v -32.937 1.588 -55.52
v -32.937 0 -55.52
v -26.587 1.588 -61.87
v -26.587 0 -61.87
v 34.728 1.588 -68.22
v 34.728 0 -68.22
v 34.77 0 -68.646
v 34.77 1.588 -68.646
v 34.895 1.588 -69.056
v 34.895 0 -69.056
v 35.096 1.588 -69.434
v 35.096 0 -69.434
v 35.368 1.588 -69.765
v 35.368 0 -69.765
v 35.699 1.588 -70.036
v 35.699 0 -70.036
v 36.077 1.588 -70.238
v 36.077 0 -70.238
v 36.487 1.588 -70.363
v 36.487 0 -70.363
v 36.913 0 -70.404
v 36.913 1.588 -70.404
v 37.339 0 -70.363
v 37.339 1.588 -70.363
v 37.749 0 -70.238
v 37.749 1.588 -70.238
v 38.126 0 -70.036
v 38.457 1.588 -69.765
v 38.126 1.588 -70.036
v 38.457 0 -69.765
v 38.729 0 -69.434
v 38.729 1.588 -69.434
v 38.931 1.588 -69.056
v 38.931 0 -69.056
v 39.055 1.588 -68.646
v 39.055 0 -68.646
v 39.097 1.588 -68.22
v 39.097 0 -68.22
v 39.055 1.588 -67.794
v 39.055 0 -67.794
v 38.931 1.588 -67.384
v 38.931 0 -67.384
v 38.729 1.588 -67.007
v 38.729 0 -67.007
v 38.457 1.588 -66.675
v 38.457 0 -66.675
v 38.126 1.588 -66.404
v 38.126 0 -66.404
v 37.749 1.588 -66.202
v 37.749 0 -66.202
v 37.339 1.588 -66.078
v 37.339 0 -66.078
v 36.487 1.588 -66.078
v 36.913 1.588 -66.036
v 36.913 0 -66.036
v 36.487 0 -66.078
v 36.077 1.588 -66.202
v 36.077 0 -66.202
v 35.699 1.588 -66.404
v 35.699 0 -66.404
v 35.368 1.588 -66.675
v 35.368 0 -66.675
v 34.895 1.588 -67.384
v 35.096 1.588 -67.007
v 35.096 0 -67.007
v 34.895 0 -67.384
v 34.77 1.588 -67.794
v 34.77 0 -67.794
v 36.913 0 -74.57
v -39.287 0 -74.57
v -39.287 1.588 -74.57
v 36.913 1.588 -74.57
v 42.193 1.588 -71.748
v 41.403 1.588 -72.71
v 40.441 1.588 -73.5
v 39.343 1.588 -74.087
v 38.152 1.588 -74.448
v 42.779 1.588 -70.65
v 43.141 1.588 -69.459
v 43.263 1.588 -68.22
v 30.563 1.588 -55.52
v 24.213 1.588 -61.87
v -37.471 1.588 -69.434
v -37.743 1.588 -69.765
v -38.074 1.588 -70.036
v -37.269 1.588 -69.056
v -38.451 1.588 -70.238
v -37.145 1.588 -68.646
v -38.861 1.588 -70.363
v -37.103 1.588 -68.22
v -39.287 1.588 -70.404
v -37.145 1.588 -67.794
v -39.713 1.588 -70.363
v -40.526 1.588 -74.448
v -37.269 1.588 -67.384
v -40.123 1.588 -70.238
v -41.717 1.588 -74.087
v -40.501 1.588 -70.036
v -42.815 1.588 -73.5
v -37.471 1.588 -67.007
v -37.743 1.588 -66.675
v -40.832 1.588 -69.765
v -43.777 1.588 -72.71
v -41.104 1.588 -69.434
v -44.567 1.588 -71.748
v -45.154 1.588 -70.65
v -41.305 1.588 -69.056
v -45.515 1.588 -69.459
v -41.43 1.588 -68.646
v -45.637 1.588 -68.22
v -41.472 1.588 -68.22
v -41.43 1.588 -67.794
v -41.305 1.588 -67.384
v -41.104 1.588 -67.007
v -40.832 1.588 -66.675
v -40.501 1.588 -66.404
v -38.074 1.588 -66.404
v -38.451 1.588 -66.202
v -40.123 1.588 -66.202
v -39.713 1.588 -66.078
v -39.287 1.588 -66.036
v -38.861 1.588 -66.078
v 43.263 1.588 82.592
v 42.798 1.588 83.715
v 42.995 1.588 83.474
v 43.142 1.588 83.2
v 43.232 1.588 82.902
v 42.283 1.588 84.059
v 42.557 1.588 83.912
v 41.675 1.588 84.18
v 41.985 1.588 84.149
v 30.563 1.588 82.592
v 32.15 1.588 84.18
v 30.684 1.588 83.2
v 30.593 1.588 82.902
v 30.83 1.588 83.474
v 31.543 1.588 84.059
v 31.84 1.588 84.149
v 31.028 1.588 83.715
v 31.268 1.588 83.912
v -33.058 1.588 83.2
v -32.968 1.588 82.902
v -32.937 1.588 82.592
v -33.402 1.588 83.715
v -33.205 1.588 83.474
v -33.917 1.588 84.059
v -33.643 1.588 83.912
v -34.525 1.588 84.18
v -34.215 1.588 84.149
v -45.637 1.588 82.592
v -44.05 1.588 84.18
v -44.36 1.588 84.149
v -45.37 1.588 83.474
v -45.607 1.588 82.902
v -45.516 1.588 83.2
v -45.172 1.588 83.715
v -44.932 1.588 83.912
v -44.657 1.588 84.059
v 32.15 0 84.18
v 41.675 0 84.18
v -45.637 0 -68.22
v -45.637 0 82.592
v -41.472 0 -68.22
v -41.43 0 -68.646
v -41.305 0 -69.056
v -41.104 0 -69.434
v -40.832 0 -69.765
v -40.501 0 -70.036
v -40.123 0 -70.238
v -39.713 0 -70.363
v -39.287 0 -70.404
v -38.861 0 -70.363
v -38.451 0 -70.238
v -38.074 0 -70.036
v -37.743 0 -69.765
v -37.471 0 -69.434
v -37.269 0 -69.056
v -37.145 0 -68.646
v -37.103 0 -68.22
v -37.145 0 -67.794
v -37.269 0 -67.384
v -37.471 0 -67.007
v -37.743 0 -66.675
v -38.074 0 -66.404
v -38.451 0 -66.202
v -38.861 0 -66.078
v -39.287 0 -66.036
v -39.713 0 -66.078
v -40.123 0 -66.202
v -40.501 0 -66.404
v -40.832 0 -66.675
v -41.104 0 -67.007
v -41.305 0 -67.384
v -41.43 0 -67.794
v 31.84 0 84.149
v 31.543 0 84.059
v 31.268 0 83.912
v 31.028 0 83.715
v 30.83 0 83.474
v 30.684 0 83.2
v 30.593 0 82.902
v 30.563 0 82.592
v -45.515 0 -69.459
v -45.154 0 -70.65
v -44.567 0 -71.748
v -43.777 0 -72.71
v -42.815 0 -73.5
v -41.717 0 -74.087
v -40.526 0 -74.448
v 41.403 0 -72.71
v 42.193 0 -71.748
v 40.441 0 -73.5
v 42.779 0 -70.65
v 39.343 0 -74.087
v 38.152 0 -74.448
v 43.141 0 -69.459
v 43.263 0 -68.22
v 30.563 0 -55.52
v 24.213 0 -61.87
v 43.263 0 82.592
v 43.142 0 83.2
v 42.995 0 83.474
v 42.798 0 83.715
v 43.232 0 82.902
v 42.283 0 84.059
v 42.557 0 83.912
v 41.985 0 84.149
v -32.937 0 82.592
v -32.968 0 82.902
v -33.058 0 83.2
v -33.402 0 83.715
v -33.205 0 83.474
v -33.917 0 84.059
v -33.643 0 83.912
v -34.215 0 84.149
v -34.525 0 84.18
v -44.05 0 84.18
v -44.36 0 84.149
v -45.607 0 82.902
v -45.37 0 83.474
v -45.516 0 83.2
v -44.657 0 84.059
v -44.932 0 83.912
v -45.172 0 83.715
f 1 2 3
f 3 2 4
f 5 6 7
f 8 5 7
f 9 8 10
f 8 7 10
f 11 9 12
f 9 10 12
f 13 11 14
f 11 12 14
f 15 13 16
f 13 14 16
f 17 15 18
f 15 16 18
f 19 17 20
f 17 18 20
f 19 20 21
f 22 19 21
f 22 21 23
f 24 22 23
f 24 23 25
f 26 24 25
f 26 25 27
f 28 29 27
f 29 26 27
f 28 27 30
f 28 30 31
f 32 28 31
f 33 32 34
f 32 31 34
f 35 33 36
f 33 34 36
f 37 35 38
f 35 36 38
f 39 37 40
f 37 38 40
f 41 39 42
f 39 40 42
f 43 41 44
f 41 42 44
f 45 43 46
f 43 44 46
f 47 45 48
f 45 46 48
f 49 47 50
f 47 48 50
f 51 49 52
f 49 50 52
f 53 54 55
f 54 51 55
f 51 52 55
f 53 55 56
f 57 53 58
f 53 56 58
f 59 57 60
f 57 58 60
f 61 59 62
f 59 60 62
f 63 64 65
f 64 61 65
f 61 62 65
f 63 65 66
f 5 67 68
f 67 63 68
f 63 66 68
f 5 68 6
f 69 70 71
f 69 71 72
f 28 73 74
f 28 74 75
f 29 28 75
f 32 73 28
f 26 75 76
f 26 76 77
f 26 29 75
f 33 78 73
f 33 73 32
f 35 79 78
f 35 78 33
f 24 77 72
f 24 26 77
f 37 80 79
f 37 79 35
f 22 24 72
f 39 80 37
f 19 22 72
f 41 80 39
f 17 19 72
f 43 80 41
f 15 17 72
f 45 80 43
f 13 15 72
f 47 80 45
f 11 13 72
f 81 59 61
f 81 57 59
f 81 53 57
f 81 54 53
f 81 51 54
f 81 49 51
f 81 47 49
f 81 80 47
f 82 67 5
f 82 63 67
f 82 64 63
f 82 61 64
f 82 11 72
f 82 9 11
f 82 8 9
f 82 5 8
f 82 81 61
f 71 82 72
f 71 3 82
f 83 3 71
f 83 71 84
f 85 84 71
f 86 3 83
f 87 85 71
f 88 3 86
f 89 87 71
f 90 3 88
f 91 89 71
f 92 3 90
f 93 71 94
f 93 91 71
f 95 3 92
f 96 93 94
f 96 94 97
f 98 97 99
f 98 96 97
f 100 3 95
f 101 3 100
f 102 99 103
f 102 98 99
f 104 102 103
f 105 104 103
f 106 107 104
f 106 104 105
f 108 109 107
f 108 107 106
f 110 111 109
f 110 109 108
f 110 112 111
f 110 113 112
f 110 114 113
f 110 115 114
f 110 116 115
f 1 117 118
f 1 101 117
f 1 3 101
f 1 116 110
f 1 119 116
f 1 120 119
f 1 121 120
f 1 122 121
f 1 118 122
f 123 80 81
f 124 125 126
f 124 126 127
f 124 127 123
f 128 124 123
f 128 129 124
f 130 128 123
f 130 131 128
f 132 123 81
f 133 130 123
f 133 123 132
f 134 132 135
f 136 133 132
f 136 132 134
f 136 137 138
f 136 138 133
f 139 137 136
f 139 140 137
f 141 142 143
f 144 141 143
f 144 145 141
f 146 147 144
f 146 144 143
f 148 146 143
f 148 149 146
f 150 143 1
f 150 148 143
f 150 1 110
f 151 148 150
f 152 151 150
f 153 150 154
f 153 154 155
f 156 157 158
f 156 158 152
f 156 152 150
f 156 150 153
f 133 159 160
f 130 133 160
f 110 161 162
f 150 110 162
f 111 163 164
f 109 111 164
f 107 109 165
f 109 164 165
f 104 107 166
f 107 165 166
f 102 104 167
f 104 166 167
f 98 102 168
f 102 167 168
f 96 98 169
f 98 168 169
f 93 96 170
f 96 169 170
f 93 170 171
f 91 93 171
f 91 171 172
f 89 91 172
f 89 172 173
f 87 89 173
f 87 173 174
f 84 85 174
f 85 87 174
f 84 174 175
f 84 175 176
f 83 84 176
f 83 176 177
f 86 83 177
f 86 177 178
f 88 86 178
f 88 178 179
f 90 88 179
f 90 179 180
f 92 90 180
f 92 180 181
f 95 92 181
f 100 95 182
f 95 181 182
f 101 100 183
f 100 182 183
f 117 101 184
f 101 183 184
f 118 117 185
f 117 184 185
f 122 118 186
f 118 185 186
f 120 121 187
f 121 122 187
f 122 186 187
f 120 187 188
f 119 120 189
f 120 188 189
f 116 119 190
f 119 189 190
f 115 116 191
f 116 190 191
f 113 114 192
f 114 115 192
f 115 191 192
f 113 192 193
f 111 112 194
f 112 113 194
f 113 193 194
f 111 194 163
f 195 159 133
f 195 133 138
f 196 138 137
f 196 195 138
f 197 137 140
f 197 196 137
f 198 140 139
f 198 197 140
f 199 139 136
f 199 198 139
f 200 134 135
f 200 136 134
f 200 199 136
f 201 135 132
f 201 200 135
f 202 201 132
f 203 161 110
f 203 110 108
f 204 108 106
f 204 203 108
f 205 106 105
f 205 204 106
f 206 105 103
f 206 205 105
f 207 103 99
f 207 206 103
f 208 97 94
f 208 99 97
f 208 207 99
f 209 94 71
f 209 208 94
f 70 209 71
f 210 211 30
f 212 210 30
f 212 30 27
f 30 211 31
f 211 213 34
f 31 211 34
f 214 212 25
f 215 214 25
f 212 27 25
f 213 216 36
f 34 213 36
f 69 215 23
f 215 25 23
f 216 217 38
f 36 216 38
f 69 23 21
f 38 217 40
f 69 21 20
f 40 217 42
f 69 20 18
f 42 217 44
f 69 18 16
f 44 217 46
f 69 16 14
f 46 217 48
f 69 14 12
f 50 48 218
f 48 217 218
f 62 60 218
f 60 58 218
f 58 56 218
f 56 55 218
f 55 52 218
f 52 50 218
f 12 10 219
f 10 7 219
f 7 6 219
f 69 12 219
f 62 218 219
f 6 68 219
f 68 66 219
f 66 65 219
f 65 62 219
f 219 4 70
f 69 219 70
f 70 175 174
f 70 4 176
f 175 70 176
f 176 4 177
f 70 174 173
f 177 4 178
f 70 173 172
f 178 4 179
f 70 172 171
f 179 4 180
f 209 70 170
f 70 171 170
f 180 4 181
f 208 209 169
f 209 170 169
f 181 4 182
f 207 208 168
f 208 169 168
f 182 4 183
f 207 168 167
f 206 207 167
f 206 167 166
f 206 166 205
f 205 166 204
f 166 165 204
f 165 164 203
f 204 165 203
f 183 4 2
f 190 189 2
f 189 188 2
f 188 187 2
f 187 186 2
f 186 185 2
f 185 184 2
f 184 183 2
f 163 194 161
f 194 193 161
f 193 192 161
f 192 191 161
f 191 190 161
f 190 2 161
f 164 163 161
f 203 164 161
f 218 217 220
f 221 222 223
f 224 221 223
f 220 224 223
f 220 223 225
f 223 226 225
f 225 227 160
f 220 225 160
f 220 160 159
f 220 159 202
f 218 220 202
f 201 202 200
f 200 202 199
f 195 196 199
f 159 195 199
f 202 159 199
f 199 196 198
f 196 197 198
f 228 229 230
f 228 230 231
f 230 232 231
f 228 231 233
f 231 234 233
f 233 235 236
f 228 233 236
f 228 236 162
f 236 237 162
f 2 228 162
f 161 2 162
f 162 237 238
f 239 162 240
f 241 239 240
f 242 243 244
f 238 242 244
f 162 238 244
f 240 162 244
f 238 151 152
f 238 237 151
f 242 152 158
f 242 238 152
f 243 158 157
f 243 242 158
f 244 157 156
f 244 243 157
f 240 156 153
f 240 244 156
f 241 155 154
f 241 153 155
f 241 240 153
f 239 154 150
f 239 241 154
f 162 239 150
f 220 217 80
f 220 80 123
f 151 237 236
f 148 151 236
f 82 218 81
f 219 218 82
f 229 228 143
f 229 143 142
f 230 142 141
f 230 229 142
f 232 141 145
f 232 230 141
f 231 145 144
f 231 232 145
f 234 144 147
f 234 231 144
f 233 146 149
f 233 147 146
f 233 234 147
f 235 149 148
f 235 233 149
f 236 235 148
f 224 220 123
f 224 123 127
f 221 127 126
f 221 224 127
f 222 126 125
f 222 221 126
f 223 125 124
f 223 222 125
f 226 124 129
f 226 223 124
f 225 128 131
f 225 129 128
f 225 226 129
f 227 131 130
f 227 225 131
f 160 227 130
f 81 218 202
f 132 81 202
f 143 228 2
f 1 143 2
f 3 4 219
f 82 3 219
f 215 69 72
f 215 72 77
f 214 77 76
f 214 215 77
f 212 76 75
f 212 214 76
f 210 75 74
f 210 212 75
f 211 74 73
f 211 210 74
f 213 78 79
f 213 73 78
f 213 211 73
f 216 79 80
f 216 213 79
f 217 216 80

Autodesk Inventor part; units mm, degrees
ref_plane "YZ Plane" through (0, 0, 0) normal (1, 0, 0) x (0, 1, 0)
ref_plane "XZ Plane" through (0, 0, 0) normal (0, 1, 0) x (-1, 0, 0)
ref_plane "XY Plane" through (0, 0, 0) normal (0, 0, 1) x (1, 0, 0)
sketch "Sketch1" plane through (0, 0, 0) normal (0, 1, 0) x (-1, 0, 0)
  circle A0 centre (-36.9127, -68.2201) radius 2.1844
  circle A1 centre (39.2873, -68.2201) radius 2.1844
  arc A2 (39.2873, -74.5701) -> (45.6373, -68.2201) centre (39.2873, -68.2201) ccw
  arc A3 (-43.2627, -68.2201) -> (-36.9127, -74.5701) centre (-36.9127, -68.2201) ccw
  line L0 (39.2873, -74.5701) -> (-36.9127, -74.5701)
  line L1 (-43.2627, -68.2201) -> (-43.2627, 82.5924)
  line L2 (45.6373, -68.2201) -> (45.6373, 82.5924)
  line L3 (32.9373, 82.5924) -> (32.9373, -55.5201)
  line L4 (-30.5627, -55.5201) -> (-30.5627, 82.5924)
  line L5 (-32.1502, 84.1799) -> (-41.6752, 84.1799)
  line L6 (44.0498, 84.1799) -> (34.5248, 84.1799)
  arc A4 (45.6373, 82.5924) -> (44.0498, 84.1799) centre (44.0498, 82.5924) ccw
  arc A5 (34.5248, 84.1799) -> (32.9373, 82.5924) centre (34.5248, 82.5924) ccw
  arc A6 (-30.5627, 82.5924) -> (-32.1502, 84.1799) centre (-32.1502, 82.5924) ccw
  arc A7 (-41.6752, 84.1799) -> (-43.2627, 82.5924) centre (-41.6752, 82.5924) ccw
  line L7 (26.5873, -61.8701) -> (-24.2127, -61.8701)
  line L8 (32.9373, -55.5201) -> (26.5873, -61.8701)
  line L9 (-30.5627, -55.5201) -> (-24.2127, -61.8701)
  point P0 (0, 0)
  point P1 (-43.2627, 84.1799)
  point P2 (45.6373, 84.1799)
  point P3 (-30.5627, -61.8701)
  point P4 (32.9373, -61.8701)
  dimension "d0" = 152.4
  dimension "d1" = 152.4
  dimension "d2" = 1.5875
  dimension "d3" = 6.35
  dimension "d4" = 6.35
  dimension "d5" = 6.35
  dimension "d6" = 6.35
extrude "Extrusion1" add sketch "Sketch1" along normal blind 1.5875
equation "\"d4\" = d3"
equation "\"d5\" = d3"
equation "\"d6\" = d5"
properties part number "Ring Guard" material "Acetal Resin, White"
